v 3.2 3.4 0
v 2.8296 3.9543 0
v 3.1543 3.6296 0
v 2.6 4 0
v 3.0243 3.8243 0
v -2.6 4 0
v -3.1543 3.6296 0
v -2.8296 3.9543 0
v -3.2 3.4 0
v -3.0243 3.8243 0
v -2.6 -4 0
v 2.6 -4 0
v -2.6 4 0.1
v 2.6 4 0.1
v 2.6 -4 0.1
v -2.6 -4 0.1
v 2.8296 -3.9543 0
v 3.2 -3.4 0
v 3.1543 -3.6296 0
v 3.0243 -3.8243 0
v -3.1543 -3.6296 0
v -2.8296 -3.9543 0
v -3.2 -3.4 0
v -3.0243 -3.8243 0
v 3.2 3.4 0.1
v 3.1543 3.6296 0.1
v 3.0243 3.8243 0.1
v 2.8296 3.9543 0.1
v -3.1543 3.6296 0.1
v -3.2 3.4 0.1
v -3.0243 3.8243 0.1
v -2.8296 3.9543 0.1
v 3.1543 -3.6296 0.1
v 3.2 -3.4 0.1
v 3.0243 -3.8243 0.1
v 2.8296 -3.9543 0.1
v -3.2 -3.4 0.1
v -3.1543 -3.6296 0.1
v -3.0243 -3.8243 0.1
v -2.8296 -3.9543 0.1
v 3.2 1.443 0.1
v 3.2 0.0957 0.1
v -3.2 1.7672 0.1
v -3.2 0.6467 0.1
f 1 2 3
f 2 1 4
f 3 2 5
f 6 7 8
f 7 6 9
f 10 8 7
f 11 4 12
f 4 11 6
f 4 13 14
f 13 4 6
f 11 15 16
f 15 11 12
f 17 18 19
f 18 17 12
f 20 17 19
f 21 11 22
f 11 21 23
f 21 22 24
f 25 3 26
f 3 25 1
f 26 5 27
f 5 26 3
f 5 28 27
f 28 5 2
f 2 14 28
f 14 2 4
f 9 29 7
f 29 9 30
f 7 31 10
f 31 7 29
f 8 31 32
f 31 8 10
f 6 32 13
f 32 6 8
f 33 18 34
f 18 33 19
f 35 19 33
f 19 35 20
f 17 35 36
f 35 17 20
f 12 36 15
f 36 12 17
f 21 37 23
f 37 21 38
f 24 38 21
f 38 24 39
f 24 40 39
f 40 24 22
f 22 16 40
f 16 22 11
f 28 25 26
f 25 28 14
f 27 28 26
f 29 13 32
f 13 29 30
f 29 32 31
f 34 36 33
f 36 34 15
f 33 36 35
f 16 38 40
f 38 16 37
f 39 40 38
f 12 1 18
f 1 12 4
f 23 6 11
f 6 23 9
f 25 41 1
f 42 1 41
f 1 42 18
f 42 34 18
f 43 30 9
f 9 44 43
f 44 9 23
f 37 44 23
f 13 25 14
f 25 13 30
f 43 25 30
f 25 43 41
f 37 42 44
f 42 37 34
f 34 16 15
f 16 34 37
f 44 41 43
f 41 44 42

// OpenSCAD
// file: ../p/box3u12.scad
use <../lib.scad>
function ldraw_lib__box3u12() = [
// 0 Box with 3 Parallel Faces without Any Edges
// 0 Name: box3u12.dat
// 0 Author: J.C. Tchang [tchang]
// 0 !LDRAW_ORG Primitive UPDATE 2014-02
// 0 !LICENSE Licensed under CC BY 4.0 : see CAreadme.txt
// 
// 0 BFC CERTIFY CCW
  [0,"BFC","CERTIFY"],
  [0,"BFC","CCW"],
// 
// 0 !HISTORY 2014-12-23 [PTadmin] Official Update 2014-02
// 
// 
// 4 16 -1 1 1 1 1 1 1 1 -1 -1 1 -1
  [4,16,-1,1,1,1,1,1,1,1,-1,-1,1,-1],
// 4 16 -1 1 1 -1 0 1 1 0 1 1 1 1
  [4,16,-1,1,1,-1,0,1,1,0,1,1,1,1],
// 4 16 1 1 -1 1 0 -1 -1 0 -1 -1 1 -1
  [4,16,1,1,-1,1,0,-1,-1,0,-1,-1,1,-1],
];
module ldraw_lib__box3u12(step=0, col=false, unit=2/5, alt=false, line=0.2, solid=!$preview)
    makepoly(ldraw_lib__box3u12(), step=step, col=col, unit=unit, alt=alt, line=line, solid=solid);
ldraw_lib__box3u12(line=0.2);
// file: ../p/1-4cyli.scad
use <../lib.scad>
function ldraw_lib__1_4cyli() = [
// 0 Cylinder 0.25
// 0 Name: 1-4cyli.dat
// 0 Author: James Jessiman
// 0 !LDRAW_ORG Primitive UPDATE 2012-01
// 0 !LICENSE Licensed under CC BY 4.0 : see CAreadme.txt
// 
// 0 BFC CERTIFY CCW
  [0,"BFC","CERTIFY"],
  [0,"BFC","CCW"],
// 
// 0 !HISTORY 2002-03-23 [sbliss] Added BFC statement.
// 0 !HISTORY 2002-04-25 [PTadmin] Official Update 2002-02
// 0 !HISTORY 2007-06-22 [PTadmin] Header formatted for Contributor Agreement
// 0 !HISTORY 2008-07-01 [PTadmin] Official Update 2008-01
// 0 !HISTORY 2012-02-16 [Philo] Changed to CCW
// 0 !HISTORY 2012-03-30 [PTadmin] Official Update 2012-01
// 
// 
// 4 16 1 1 0 0.9239 1 0.3827 0.9239 0 0.3827 1 0 0
  [4,16,1,1,0,0.9239,1,0.3827,0.9239,0,0.3827,1,0,0],
// 5 24 1 0 0 1 1 0 0.9239 0 0.3827 1 0 -1
  [5,24,1,0,0,1,1,0,0.9239,0,0.3827,1,0,-1],
// 4 16 0.9239 1 0.3827 0.7071 1 0.7071 0.7071 0 0.7071 0.9239 0 0.3827
  [4,16,0.9239,1,0.3827,0.7071,1,0.7071,0.7071,0,0.7071,0.9239,0,0.3827],
// 5 24 0.9239 0 0.3827 0.9239 1 0.3827 0.7071 0 0.7071 1 0 0
  [5,24,0.9239,0,0.3827,0.9239,1,0.3827,0.7071,0,0.7071,1,0,0],
// 4 16 0.7071 1 0.7071 0.3827 1 0.9239 0.3827 0 0.9239 0.7071 0 0.7071
  [4,16,0.7071,1,0.7071,0.3827,1,0.9239,0.3827,0,0.9239,0.7071,0,0.7071],
// 5 24 0.7071 0 0.7071 0.7071 1 0.7071 0.3827 0 0.9239 0.9239 0 0.3827
  [5,24,0.7071,0,0.7071,0.7071,1,0.7071,0.3827,0,0.9239,0.9239,0,0.3827],
// 4 16 0.3827 1 0.9239 0 1 1 0 0 1 0.3827 0 0.9239
  [4,16,0.3827,1,0.9239,0,1,1,0,0,1,0.3827,0,0.9239],
// 5 24 0.3827 0 0.9239 0.3827 1 0.9239 0 0 1 0.7071 0 0.7071
  [5,24,0.3827,0,0.9239,0.3827,1,0.9239,0,0,1,0.7071,0,0.7071],
// 5 24 0 0 1 0 1 1 0.3827 0 0.9239 -1 0 1
  [5,24,0,0,1,0,1,1,0.3827,0,0.9239,-1,0,1],
];
module ldraw_lib__1_4cyli(step=0, col=false, unit=2/5, alt=false, line=0.2, solid=!$preview)
    makepoly(ldraw_lib__1_4cyli(), step=step, col=col, unit=unit, alt=alt, line=line, solid=solid);
ldraw_lib__1_4cyli(line=0.2);
// file: ../p/1-4chrd.scad
use <../lib.scad>
function ldraw_lib__1_4chrd() = [
// 0 Chord 0.25
// 0 Name: 1-4chrd.dat
// 0 Author: Max Martin Richter [MMR1988]
// 0 !LDRAW_ORG Primitive UPDATE 2023-05
// 0 !LICENSE Licensed under CC BY 4.0 : see CAreadme.txt
// 
// 0 BFC CERTIFY CCW
  [0,"BFC","CERTIFY"],
  [0,"BFC","CCW"],
// 
// 0 !HISTORY 2004-04-22 [PTadmin] Official Update 2004-02
// 0 !HISTORY 2007-10-09 [PTadmin] Header formatted for Contributor Agreement
// 0 !HISTORY 2008-07-01 [PTadmin] Official Update 2008-01
// 0 !HISTORY 2012-08-02 [MMR1988] Re-creation with PrimGen2 and Rectifier
// 0 !HISTORY 2012-08-09 [PTadmin] Official Update 2012-02
// 0 !HISTORY 2023-10-27 [OrionP] Change author to MMR1988 from hafhead
// 0 !HISTORY 2023-10-31 [OrionP] Official Update 2023-05
// 
// 4 16 0.9239 0 0.3827 0.3827 0 0.9239 0 0 1 1 0 0
  [4,16,0.9239,0,0.3827,0.3827,0,0.9239,0,0,1,1,0,0],
// 3 16 0.7071 0 0.7071 0.3827 0 0.9239 0.9239 0 0.3827
  [3,16,0.7071,0,0.7071,0.3827,0,0.9239,0.9239,0,0.3827],
];
module ldraw_lib__1_4chrd(step=0, col=false, unit=2/5, alt=false, line=0.2, solid=!$preview)
    makepoly(ldraw_lib__1_4chrd(), step=step, col=col, unit=unit, alt=alt, line=line, solid=solid);
ldraw_lib__1_4chrd(line=0.2);
// file: 6148328z.scad
use <../lib.scad>
use <../p/1-4chrd.scad>
use <../p/1-4cyli.scad>
use <../p/box3u12.scad>
function ldraw_lib__6148328z() = [
// 0 Sticker  1.0 x  0.8 with White Stripe on Red Background Left
// 0 Name: 6148328z.dat
// 0 Author: Massimo Maso [Sirio]
// 0 !LDRAW_ORG Part UPDATE 2024-05
// 0 !LICENSE Licensed under CC BY 4.0 : see CAreadme.txt
// 
// 0 BFC CERTIFY CCW
  [0,"BFC","CERTIFY"],
  [0,"BFC","CCW"],
// 
// 0 !KEYWORDS 917K, Bricklink 75876stk01, Brickowl 852010, Pit Lane, Porsche
// 0 !KEYWORDS Rebrickable 26357, set 75876, Speed Champions
// 
// 0 !HISTORY 2024-06-30 [OrionP] Official Update 2024-05
// 
// 
// 0 // Primitives
// 
// 1 16 -6.5 0 8.5 -1.5 0 0 0 -1 0 0 0 1.5 1-4chrd.dat
  [1,16,-6.5,0,8.5,-1.5,0,0,0,-1,0,0,0,1.5, ldraw_lib__1_4chrd()],
// 1 16 6.5 0 8.5 1.5 0 0 0 -1 0 0 0 1.5 1-4chrd.dat
  [1,16,6.5,0,8.5,1.5,0,0,0,-1,0,0,0,1.5, ldraw_lib__1_4chrd()],
// 1 16 0 -.25 0 6.5 0 0 0 .25 0 0 0 10 box3u12.dat
  [1,16,0,-.25,0,6.5,0,0,0,.25,0,0,0,10, ldraw_lib__box3u12()],
// 1 16 -6.5 0 -8.5 -1.5 0 0 0 -1 0 0 0 -1.5 1-4chrd.dat
  [1,16,-6.5,0,-8.5,-1.5,0,0,0,-1,0,0,0,-1.5, ldraw_lib__1_4chrd()],
// 1 16 6.5 0 -8.5 1.5 0 0 0 -1 0 0 0 -1.5 1-4chrd.dat
  [1,16,6.5,0,-8.5,1.5,0,0,0,-1,0,0,0,-1.5, ldraw_lib__1_4chrd()],
// 1 16 -6.5 0 8.5 -1.5 0 0 0 -.25 0 0 0 1.5 1-4cyli.dat
  [1,16,-6.5,0,8.5,-1.5,0,0,0,-.25,0,0,0,1.5, ldraw_lib__1_4cyli()],
// 1 16 6.5 0 8.5 1.5 0 0 0 -.25 0 0 0 1.5 1-4cyli.dat
  [1,16,6.5,0,8.5,1.5,0,0,0,-.25,0,0,0,1.5, ldraw_lib__1_4cyli()],
// 1 16 -6.5 0 -8.5 -1.5 0 0 0 -.25 0 0 0 -1.5 1-4cyli.dat
  [1,16,-6.5,0,-8.5,-1.5,0,0,0,-.25,0,0,0,-1.5, ldraw_lib__1_4cyli()],
// 1 16 6.5 0 -8.5 1.5 0 0 0 -.25 0 0 0 -1.5 1-4cyli.dat
  [1,16,6.5,0,-8.5,1.5,0,0,0,-.25,0,0,0,-1.5, ldraw_lib__1_4cyli()],
// 1 4 -6.5 -.25 8.5 -1.5 0 0 0 1 0 0 0 1.5 1-4chrd.dat
  [1,4,-6.5,-.25,8.5,-1.5,0,0,0,1,0,0,0,1.5, ldraw_lib__1_4chrd()],
// 1 4 6.5 -.25 8.5 1.5 0 0 0 1 0 0 0 1.5 1-4chrd.dat
  [1,4,6.5,-.25,8.5,1.5,0,0,0,1,0,0,0,1.5, ldraw_lib__1_4chrd()],
// 1 4 -6.5 -.25 -8.5 -1.5 0 0 0 1 0 0 0 -1.5 1-4chrd.dat
  [1,4,-6.5,-.25,-8.5,-1.5,0,0,0,1,0,0,0,-1.5, ldraw_lib__1_4chrd()],
// 1 4 6.5 -.25 -8.5 1.5 0 0 0 1 0 0 0 -1.5 1-4chrd.dat
  [1,4,6.5,-.25,-8.5,1.5,0,0,0,1,0,0,0,-1.5, ldraw_lib__1_4chrd()],
// 0 // Bottom faces
// 4 16 -6.5 0 10 -6.5 0 -10 -8 0 -8.5 -8 0 8.5
  [4,16,-6.5,0,10,-6.5,0,-10,-8,0,-8.5,-8,0,8.5],
// 4 16 6.5 0 10 8 0 8.5 8 0 -8.5 6.5 0 -10
  [4,16,6.5,0,10,8,0,8.5,8,0,-8.5,6.5,0,-10],
// 0 // Lateral faces
// 3 16 -8 0 8.5 -8 -.25 3.6076 -8 -.25 8.5
  [3,16,-8,0,8.5,-8,-.25,3.6076,-8,-.25,8.5],
// 4 16 -8 0 8.5 -8 0 -8.5 -8 -.25 .2392 -8 -.25 3.6076
  [4,16,-8,0,8.5,-8,0,-8.5,-8,-.25,.2392,-8,-.25,3.6076],
// 3 16 -8 0 -8.5 -8 -.25 -8.5 -8 -.25 .2392
  [3,16,-8,0,-8.5,-8,-.25,-8.5,-8,-.25,.2392],
// 3 16 8 0 8.5 8 -.25 8.5 8 -.25 4.4179
  [3,16,8,0,8.5,8,-.25,8.5,8,-.25,4.4179],
// 4 16 8 0 8.5 8 -.25 4.4179 8 -.25 1.6167 8 0 -8.5
  [4,16,8,0,8.5,8,-.25,4.4179,8,-.25,1.6167,8,0,-8.5],
// 3 16 8 0 -8.5 8 -.25 1.6167 8 -.25 -8.5
  [3,16,8,0,-8.5,8,-.25,1.6167,8,-.25,-8.5],
// 0 // Top faces
// 0 // Red faces
// 4 4 -8 -.25 8.5 8 -.25 8.5 6.5 -.25 10 -6.5 -.25 10
  [4,4,-8,-.25,8.5,8,-.25,8.5,6.5,-.25,10,-6.5,-.25,10],
// 4 4 -8 -.25 8.5 -8 -.25 3.6076 8 -.25 4.4179 8 -.25 8.5
  [4,4,-8,-.25,8.5,-8,-.25,3.6076,8,-.25,4.4179,8,-.25,8.5],
// 4 4 -8 -.25 -8.5 8 -.25 -8.5 8 -.25 1.6167 -8 -.25 .2392
  [4,4,-8,-.25,-8.5,8,-.25,-8.5,8,-.25,1.6167,-8,-.25,.2392],
// 4 4 -8 -.25 -8.5 -6.5 -.25 -10 6.5 -.25 -10 8 -.25 -8.5
  [4,4,-8,-.25,-8.5,-6.5,-.25,-10,6.5,-.25,-10,8,-.25,-8.5],
// 0 // White face
// 4 15 -8 -.25 3.6076 -8 -.25 .2392 8 -.25 1.6167 8 -.25 4.4179
  [4,15,-8,-.25,3.6076,-8,-.25,.2392,8,-.25,1.6167,8,-.25,4.4179],
];
module ldraw_lib__6148328z(step=0, col=false, unit=2/5, alt=false, line=0.2, solid=!$preview)
    makepoly(ldraw_lib__6148328z(), step=step, col=col, unit=unit, alt=alt, line=line, solid=solid);
ldraw_lib__6148328z(line=0.2);
// main file
use <../lib.scad>
use <6148328z.scad>
function ldraw_lib__6148328ai() = [
// 0 Sticker  1.0 x  0.8 with White Stripe on Red Background Right
// 0 Name: 6148328ai.dat
// 0 Author: Massimo Maso [Sirio]
// 0 !LDRAW_ORG Part UPDATE 2024-05
// 0 !LICENSE Licensed under CC BY 4.0 : see CAreadme.txt
// 
// 0 BFC CERTIFY CCW
  [0,"BFC","CERTIFY"],
  [0,"BFC","CCW"],
// 
// 0 !KEYWORDS 917K, Bricklink 75876stk01, Brickowl 852010, Pit Lane, Porsche
// 0 !KEYWORDS Rebrickable 26357, set 75876, Speed Champions
// 
// 0 !HISTORY 2024-06-30 [OrionP] Official Update 2024-05
// 
// 
// 1 16 0 0 0 -1 0 0 0 1 0 0 0 1 6148328z.dat
  [1,16,0,0,0,-1,0,0,0,1,0,0,0,1, ldraw_lib__6148328z()],
];
module ldraw_lib__6148328ai(step=0, col=false, unit=2/5, alt=false, line=0.2, solid=!$preview)
    makepoly(ldraw_lib__6148328ai(), step=step, col=col, unit=unit, alt=alt, line=line, solid=solid);
ldraw_lib__6148328ai(line=0.2);
